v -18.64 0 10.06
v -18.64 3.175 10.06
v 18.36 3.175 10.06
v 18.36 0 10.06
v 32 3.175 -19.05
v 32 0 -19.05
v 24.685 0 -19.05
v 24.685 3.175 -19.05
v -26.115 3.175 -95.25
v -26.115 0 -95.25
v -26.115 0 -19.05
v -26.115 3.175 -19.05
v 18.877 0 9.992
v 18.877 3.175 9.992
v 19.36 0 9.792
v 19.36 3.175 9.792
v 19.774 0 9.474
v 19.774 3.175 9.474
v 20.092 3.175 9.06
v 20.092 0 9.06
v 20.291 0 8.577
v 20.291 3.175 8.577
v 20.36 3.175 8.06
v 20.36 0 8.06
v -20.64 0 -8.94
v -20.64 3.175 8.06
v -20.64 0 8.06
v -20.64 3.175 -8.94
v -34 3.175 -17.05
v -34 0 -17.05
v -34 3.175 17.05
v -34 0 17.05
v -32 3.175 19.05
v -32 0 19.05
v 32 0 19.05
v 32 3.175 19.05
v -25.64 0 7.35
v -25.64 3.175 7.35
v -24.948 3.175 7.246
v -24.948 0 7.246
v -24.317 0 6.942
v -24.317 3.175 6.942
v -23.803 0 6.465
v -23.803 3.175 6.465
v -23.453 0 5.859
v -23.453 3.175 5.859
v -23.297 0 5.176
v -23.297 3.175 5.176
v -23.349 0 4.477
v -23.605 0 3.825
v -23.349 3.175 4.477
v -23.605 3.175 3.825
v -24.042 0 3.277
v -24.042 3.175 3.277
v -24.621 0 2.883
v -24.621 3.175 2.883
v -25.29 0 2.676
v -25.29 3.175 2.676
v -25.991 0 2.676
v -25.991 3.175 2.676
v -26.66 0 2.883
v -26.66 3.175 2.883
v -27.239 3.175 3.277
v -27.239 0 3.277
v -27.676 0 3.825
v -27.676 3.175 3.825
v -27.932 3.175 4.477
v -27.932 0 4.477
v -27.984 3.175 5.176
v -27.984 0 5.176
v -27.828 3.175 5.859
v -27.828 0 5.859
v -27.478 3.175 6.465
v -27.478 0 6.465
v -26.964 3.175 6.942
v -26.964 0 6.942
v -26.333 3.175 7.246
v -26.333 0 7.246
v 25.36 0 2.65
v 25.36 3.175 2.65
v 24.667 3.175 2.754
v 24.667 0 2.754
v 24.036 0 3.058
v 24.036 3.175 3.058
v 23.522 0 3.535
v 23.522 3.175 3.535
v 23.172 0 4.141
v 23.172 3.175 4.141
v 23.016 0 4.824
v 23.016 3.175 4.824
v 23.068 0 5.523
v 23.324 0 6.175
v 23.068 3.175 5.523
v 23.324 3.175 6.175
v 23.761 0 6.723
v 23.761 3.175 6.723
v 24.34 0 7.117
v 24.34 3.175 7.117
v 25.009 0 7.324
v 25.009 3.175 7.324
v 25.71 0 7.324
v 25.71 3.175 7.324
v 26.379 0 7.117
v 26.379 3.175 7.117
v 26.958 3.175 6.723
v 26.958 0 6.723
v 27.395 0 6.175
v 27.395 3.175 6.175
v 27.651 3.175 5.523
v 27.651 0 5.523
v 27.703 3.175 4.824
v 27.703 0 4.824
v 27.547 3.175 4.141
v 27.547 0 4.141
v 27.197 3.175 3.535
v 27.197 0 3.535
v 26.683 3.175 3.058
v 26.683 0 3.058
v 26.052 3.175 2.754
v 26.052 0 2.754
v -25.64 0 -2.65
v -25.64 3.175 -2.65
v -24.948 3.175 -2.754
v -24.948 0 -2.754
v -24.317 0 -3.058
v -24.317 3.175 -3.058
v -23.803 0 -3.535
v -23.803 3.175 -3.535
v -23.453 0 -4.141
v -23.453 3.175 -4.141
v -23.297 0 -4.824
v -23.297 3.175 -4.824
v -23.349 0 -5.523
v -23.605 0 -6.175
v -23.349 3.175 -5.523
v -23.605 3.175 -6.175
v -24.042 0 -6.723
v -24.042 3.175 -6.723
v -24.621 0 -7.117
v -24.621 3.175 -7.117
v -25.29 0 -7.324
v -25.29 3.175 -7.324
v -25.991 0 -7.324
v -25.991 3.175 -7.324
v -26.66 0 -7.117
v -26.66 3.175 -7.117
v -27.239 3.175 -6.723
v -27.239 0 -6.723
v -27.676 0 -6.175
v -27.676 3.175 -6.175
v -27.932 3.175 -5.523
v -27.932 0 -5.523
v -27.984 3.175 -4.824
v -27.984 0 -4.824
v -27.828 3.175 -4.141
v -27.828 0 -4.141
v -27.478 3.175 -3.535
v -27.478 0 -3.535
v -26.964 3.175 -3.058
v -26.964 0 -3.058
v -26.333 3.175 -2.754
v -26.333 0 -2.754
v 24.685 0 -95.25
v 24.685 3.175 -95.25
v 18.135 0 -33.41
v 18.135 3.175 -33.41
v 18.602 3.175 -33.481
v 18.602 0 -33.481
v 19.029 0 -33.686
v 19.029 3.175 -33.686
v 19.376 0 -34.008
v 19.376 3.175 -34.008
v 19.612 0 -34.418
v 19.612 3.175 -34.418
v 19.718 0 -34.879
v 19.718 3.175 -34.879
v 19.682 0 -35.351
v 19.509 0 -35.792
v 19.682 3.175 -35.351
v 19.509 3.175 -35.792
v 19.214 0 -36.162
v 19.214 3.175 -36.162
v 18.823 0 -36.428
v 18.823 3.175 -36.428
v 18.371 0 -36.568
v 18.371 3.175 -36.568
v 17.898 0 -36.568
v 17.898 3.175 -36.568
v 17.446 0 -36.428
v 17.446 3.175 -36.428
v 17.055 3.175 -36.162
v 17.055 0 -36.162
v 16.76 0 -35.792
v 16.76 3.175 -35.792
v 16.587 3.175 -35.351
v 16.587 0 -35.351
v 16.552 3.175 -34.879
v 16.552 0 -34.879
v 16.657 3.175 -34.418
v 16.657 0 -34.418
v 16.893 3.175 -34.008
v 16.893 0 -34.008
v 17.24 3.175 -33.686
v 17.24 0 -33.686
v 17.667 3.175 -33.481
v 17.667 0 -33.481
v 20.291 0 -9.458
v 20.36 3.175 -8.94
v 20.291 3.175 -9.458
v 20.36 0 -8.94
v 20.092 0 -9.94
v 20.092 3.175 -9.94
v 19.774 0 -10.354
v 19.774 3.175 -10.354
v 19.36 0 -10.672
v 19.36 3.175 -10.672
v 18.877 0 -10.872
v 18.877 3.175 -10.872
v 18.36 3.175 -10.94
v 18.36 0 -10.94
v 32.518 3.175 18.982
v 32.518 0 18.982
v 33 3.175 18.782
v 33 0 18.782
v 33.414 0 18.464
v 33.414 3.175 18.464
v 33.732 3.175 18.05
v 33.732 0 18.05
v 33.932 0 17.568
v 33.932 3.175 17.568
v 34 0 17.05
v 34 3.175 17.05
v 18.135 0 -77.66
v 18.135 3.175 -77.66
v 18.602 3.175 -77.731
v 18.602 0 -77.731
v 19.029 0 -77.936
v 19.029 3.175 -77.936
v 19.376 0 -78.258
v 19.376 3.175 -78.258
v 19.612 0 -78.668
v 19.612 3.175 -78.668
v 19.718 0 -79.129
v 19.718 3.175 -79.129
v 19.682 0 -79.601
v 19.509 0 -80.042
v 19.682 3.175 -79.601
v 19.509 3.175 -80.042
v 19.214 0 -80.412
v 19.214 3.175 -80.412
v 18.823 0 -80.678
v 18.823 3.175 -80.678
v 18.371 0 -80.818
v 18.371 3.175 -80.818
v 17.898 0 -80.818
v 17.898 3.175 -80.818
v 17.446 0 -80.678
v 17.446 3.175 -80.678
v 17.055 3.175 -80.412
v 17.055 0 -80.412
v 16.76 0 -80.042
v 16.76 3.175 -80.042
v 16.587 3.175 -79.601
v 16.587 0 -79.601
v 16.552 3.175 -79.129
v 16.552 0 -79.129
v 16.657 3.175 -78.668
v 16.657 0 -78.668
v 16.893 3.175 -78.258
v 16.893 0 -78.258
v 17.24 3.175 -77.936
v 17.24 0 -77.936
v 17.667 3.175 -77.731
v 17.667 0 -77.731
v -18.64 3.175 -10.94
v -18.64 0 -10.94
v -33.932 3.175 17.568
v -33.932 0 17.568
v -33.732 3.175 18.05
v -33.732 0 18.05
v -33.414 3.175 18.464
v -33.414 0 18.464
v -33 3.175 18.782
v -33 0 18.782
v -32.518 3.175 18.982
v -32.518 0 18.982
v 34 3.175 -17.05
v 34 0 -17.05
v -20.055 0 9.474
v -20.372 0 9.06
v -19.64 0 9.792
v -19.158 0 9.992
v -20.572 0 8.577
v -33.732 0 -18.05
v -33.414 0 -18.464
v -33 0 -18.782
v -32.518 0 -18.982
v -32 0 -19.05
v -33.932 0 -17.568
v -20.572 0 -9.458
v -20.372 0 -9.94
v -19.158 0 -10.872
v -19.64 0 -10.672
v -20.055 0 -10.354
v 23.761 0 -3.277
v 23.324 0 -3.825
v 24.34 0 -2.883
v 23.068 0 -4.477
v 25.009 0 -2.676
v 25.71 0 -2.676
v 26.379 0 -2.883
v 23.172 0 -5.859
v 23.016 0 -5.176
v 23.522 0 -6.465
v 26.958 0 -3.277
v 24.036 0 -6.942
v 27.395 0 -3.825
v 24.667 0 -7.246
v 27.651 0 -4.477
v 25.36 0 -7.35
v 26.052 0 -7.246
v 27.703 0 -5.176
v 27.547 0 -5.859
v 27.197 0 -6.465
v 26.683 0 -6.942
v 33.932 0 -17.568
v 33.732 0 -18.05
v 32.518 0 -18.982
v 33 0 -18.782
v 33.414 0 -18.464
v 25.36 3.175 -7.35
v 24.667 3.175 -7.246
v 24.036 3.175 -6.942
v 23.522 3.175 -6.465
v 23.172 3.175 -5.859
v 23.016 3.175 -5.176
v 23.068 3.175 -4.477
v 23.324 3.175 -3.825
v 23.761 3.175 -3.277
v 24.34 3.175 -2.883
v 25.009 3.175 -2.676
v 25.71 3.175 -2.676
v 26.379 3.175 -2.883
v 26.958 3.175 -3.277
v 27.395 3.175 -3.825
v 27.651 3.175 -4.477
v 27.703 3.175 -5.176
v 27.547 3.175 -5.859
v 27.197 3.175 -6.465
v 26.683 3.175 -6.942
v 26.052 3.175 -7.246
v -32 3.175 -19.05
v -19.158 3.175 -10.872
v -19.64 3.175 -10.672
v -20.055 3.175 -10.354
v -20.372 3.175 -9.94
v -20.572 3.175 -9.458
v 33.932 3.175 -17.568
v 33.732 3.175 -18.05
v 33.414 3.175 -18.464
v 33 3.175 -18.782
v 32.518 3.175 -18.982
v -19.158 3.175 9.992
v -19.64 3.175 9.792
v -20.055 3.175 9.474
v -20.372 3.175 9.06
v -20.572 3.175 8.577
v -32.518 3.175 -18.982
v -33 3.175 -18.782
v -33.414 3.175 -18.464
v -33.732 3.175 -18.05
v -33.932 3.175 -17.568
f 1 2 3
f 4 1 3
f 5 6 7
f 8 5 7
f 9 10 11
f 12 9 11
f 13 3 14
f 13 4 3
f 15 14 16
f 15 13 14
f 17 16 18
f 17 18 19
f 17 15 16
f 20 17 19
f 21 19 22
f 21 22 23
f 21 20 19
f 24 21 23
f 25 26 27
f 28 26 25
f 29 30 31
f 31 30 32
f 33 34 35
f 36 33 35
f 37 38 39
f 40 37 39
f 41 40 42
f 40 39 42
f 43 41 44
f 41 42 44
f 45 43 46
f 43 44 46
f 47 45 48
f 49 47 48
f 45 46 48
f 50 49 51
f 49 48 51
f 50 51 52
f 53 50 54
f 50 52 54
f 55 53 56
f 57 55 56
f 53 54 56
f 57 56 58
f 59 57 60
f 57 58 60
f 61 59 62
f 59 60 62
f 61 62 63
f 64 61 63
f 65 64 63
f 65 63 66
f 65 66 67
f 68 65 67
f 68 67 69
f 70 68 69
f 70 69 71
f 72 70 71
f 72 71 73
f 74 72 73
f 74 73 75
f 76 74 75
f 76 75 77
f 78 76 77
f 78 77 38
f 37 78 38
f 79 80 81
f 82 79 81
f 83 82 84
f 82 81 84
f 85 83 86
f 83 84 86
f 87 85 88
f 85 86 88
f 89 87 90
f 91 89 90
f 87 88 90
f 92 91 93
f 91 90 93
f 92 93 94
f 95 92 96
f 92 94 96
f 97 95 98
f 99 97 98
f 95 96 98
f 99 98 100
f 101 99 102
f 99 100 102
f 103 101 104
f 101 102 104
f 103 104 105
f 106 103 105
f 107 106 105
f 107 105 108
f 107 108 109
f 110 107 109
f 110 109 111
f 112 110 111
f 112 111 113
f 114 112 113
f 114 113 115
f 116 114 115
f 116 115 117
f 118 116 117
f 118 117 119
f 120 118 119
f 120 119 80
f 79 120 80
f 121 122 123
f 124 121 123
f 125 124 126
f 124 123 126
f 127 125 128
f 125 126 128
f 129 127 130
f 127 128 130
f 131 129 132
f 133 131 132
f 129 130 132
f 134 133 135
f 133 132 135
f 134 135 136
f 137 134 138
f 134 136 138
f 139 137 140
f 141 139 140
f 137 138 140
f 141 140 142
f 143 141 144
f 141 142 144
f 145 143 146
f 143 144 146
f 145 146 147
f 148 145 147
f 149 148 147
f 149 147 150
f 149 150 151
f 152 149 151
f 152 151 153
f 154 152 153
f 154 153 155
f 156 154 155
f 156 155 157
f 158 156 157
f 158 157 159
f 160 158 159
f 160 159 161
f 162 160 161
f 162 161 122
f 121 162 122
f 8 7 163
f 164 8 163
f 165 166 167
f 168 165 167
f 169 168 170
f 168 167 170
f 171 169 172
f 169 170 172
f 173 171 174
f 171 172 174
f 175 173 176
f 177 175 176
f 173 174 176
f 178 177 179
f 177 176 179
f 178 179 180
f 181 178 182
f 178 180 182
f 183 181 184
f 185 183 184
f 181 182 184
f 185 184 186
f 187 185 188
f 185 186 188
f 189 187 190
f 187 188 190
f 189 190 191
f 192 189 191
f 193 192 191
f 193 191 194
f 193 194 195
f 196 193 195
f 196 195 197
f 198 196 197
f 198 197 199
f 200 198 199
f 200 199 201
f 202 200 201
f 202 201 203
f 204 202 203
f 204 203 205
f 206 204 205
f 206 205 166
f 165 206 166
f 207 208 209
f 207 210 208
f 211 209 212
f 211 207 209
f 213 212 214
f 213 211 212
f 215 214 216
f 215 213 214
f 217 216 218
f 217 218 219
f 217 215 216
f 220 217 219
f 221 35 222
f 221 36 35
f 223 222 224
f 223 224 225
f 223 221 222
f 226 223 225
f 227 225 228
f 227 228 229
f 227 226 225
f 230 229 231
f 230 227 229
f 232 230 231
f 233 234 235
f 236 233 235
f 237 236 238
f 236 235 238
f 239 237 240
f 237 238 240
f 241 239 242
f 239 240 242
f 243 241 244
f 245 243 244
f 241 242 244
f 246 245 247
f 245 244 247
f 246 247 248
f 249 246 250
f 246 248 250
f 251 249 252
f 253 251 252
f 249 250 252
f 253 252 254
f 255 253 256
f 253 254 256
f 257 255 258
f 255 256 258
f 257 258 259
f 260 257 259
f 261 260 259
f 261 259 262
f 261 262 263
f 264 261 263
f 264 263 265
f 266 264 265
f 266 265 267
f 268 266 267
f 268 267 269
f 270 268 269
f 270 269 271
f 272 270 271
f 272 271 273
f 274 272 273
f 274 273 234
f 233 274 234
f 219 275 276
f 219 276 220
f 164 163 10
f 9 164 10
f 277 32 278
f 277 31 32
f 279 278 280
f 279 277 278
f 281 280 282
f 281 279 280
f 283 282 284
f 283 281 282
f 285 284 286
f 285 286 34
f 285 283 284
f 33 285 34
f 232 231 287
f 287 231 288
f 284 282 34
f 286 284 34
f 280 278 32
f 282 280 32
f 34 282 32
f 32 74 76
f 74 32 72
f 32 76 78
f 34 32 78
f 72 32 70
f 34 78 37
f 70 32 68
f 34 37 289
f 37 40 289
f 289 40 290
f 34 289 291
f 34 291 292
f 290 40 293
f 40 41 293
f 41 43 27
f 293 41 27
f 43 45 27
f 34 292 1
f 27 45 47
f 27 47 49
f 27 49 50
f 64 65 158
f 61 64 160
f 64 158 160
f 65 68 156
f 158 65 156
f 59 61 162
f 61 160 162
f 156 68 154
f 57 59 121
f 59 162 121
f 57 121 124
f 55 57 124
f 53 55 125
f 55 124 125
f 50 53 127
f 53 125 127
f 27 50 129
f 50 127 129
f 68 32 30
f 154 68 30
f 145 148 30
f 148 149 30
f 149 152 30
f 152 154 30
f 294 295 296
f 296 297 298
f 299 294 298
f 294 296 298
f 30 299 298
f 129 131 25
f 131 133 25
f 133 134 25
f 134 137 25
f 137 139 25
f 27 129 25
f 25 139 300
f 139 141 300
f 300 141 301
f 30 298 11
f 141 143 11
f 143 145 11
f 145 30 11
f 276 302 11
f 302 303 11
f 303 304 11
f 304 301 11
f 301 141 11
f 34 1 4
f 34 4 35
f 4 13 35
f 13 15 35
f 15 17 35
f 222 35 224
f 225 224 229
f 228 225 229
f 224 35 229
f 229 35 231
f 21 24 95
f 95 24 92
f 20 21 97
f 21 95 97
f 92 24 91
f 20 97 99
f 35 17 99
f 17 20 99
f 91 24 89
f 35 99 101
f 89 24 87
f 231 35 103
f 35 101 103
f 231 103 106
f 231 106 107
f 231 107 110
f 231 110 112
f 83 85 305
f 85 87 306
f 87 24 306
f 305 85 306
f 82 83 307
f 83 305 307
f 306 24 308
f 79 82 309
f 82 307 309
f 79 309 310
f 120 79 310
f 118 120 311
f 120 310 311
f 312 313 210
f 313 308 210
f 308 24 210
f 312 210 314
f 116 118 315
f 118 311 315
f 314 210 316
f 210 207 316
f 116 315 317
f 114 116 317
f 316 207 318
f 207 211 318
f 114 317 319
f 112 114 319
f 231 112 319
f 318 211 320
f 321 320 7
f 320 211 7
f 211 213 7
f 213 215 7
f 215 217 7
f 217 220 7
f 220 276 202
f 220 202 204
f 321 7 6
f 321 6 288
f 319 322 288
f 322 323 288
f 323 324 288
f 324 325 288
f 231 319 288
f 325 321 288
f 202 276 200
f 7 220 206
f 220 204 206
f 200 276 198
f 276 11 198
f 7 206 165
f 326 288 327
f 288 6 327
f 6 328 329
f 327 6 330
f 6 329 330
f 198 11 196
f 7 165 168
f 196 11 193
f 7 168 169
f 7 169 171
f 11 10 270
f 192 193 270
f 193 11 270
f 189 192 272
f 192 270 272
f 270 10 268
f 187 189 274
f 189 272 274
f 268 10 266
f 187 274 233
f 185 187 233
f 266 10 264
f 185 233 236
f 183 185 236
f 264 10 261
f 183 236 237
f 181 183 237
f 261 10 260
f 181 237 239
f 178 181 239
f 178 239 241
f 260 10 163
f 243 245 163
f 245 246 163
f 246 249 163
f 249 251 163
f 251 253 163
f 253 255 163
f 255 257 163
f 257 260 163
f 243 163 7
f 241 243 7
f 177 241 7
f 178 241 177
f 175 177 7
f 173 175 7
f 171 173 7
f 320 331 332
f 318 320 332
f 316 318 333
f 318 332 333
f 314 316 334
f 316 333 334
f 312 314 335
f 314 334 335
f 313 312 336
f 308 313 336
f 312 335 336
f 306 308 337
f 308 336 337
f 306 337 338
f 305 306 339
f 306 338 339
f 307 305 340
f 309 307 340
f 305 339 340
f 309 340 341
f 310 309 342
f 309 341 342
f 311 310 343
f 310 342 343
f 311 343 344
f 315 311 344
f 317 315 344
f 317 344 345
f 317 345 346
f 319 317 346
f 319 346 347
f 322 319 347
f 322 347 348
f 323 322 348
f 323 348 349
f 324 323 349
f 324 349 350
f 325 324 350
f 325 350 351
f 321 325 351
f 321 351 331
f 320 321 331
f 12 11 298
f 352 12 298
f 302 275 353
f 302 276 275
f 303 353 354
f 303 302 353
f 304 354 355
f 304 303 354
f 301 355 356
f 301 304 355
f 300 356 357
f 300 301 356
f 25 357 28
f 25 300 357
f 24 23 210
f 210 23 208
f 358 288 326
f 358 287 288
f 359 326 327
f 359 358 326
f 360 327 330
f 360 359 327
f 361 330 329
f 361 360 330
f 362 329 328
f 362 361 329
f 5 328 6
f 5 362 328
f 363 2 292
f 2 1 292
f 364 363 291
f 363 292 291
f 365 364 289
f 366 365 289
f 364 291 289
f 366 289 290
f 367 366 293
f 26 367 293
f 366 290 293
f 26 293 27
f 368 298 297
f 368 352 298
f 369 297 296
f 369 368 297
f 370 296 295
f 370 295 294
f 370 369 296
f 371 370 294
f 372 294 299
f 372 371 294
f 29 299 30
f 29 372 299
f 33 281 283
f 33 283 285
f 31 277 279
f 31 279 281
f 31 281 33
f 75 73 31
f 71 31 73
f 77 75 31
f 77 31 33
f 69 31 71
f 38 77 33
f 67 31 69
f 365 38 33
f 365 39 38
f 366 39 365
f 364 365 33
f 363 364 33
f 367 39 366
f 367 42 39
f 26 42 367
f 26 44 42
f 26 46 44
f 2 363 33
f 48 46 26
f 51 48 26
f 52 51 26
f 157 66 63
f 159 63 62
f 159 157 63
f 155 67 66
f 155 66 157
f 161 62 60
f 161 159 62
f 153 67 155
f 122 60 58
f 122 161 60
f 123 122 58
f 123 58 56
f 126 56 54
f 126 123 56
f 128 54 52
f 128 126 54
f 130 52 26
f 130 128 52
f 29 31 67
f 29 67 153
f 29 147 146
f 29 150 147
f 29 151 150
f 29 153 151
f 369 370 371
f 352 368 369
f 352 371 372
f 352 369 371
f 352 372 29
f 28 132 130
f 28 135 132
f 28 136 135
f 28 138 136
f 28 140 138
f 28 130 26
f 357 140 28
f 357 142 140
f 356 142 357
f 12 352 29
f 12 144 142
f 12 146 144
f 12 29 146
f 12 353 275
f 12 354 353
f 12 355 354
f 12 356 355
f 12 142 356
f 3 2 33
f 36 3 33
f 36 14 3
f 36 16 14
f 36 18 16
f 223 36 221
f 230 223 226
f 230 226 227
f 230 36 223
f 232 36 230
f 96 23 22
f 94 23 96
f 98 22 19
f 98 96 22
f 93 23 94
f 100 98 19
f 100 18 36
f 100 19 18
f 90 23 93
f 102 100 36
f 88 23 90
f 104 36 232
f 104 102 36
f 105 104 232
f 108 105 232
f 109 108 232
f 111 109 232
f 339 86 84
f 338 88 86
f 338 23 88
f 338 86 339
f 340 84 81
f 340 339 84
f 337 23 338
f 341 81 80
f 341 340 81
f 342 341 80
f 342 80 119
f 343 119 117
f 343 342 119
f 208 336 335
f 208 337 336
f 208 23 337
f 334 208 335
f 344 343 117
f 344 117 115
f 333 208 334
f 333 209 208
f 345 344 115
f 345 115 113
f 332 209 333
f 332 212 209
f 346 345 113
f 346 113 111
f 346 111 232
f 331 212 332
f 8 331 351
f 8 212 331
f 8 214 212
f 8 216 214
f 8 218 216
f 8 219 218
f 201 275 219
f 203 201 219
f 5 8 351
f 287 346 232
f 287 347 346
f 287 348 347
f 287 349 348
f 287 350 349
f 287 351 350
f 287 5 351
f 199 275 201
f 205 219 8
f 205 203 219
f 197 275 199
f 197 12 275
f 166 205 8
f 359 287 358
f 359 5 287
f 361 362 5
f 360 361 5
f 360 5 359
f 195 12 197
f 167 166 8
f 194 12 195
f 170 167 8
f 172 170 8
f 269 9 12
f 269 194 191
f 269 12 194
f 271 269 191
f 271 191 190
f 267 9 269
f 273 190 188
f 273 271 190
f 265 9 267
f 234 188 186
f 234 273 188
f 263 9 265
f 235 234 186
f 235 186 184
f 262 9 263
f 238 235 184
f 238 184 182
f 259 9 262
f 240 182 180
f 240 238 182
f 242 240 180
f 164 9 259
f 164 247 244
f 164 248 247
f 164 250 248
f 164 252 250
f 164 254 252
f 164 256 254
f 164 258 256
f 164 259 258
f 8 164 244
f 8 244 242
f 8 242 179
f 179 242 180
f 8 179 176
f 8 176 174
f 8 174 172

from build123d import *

# Parameters (mm, degrees)
BOSS_EXTRUDE1_DEPTH = 3.175
SKETCH2_R           = 2.35
SKETCH2_W           = 41
SKETCH2_H           = 21
CUT_EXTRUDE1_DEPTH  = 102.186180504
FILLET1_R           = 2
SKETCH5_R           = 1.5875
CUT_EXTRUDE2_DEPTH  = 102.186180504


with BuildPart() as part:
    # Sketch1 → Boss-Extrude1 (new body)
    with BuildSketch(Plane(origin=(0, 0, 0), x_dir=(1, 0, 0), z_dir=(0, 1, 0))):
        Polygon((-26.115438157, 19.05), (-34, 19.05), (-34, -19.05), (34, -19.05), (34, 19.05), (24.684561843, 19.05), (24.684561843, 95.25), (-26.115438157, 95.25), align=None)
    extrude(amount=BOSS_EXTRUDE1_DEPTH)

    # Sketch2 → Cut-Extrude1 (cut, through all)
    with BuildSketch(Plane(origin=(0, 3.175, 0), x_dir=(1, 0, 0), z_dir=(0, 1, 0))):
        with Locations(Location((-25.640438157, 5, 0), (0, 0, 270))):
            Circle(SKETCH2_R)
        with Locations(Location((-25.640438157, -5, 0), (0, 0, 270))):
            Circle(SKETCH2_R)
        with Locations(Location((25.359561843, -5, 0), (0, 0, 90))):
            Circle(SKETCH2_R)
        with Locations(Location((25.359561843, 5, 0), (0, 0, 90))):
            Circle(SKETCH2_R)
        with Locations((-0.140438157, 0.440263383)):
            Rectangle(SKETCH2_W, SKETCH2_H)
    extrude(amount=-CUT_EXTRUDE1_DEPTH, mode=Mode.SUBTRACT)

    # Fillet1
    fillet1_edges = [part.edges().sort_by_distance(p)[0] for p in [
        (-34, 1.5875, -19.05),
        (34, 1.5875, -19.05),
        (34, 1.5875, 19.05),
        (-34, 1.5875, 19.05),
        (-20.640438157, 1.5875, 10.059736617),
        (-20.640438157, 1.5875, -10.940263383),
        (20.359561843, 1.5875, -10.940263383),
        (20.359561843, 1.5875, 10.059736617),
    ]]
    fillet(fillet1_edges, radius=FILLET1_R)

    # Sketch5 → Cut-Extrude2 (cut, through all)
    with BuildSketch(Plane(origin=(0, 3.175, 0), x_dir=(1, 0, 0), z_dir=(0, 1, 0))):
        with Locations(Location((18.134561843, 79.248, 0), (0, 0, 270))):
            Circle(SKETCH5_R)
        with Locations(Location((18.134561843, 34.998, 0), (0, 0, 270))):
            Circle(SKETCH5_R)
    extrude(amount=-CUT_EXTRUDE2_DEPTH, mode=Mode.SUBTRACT)


solid = part.part
